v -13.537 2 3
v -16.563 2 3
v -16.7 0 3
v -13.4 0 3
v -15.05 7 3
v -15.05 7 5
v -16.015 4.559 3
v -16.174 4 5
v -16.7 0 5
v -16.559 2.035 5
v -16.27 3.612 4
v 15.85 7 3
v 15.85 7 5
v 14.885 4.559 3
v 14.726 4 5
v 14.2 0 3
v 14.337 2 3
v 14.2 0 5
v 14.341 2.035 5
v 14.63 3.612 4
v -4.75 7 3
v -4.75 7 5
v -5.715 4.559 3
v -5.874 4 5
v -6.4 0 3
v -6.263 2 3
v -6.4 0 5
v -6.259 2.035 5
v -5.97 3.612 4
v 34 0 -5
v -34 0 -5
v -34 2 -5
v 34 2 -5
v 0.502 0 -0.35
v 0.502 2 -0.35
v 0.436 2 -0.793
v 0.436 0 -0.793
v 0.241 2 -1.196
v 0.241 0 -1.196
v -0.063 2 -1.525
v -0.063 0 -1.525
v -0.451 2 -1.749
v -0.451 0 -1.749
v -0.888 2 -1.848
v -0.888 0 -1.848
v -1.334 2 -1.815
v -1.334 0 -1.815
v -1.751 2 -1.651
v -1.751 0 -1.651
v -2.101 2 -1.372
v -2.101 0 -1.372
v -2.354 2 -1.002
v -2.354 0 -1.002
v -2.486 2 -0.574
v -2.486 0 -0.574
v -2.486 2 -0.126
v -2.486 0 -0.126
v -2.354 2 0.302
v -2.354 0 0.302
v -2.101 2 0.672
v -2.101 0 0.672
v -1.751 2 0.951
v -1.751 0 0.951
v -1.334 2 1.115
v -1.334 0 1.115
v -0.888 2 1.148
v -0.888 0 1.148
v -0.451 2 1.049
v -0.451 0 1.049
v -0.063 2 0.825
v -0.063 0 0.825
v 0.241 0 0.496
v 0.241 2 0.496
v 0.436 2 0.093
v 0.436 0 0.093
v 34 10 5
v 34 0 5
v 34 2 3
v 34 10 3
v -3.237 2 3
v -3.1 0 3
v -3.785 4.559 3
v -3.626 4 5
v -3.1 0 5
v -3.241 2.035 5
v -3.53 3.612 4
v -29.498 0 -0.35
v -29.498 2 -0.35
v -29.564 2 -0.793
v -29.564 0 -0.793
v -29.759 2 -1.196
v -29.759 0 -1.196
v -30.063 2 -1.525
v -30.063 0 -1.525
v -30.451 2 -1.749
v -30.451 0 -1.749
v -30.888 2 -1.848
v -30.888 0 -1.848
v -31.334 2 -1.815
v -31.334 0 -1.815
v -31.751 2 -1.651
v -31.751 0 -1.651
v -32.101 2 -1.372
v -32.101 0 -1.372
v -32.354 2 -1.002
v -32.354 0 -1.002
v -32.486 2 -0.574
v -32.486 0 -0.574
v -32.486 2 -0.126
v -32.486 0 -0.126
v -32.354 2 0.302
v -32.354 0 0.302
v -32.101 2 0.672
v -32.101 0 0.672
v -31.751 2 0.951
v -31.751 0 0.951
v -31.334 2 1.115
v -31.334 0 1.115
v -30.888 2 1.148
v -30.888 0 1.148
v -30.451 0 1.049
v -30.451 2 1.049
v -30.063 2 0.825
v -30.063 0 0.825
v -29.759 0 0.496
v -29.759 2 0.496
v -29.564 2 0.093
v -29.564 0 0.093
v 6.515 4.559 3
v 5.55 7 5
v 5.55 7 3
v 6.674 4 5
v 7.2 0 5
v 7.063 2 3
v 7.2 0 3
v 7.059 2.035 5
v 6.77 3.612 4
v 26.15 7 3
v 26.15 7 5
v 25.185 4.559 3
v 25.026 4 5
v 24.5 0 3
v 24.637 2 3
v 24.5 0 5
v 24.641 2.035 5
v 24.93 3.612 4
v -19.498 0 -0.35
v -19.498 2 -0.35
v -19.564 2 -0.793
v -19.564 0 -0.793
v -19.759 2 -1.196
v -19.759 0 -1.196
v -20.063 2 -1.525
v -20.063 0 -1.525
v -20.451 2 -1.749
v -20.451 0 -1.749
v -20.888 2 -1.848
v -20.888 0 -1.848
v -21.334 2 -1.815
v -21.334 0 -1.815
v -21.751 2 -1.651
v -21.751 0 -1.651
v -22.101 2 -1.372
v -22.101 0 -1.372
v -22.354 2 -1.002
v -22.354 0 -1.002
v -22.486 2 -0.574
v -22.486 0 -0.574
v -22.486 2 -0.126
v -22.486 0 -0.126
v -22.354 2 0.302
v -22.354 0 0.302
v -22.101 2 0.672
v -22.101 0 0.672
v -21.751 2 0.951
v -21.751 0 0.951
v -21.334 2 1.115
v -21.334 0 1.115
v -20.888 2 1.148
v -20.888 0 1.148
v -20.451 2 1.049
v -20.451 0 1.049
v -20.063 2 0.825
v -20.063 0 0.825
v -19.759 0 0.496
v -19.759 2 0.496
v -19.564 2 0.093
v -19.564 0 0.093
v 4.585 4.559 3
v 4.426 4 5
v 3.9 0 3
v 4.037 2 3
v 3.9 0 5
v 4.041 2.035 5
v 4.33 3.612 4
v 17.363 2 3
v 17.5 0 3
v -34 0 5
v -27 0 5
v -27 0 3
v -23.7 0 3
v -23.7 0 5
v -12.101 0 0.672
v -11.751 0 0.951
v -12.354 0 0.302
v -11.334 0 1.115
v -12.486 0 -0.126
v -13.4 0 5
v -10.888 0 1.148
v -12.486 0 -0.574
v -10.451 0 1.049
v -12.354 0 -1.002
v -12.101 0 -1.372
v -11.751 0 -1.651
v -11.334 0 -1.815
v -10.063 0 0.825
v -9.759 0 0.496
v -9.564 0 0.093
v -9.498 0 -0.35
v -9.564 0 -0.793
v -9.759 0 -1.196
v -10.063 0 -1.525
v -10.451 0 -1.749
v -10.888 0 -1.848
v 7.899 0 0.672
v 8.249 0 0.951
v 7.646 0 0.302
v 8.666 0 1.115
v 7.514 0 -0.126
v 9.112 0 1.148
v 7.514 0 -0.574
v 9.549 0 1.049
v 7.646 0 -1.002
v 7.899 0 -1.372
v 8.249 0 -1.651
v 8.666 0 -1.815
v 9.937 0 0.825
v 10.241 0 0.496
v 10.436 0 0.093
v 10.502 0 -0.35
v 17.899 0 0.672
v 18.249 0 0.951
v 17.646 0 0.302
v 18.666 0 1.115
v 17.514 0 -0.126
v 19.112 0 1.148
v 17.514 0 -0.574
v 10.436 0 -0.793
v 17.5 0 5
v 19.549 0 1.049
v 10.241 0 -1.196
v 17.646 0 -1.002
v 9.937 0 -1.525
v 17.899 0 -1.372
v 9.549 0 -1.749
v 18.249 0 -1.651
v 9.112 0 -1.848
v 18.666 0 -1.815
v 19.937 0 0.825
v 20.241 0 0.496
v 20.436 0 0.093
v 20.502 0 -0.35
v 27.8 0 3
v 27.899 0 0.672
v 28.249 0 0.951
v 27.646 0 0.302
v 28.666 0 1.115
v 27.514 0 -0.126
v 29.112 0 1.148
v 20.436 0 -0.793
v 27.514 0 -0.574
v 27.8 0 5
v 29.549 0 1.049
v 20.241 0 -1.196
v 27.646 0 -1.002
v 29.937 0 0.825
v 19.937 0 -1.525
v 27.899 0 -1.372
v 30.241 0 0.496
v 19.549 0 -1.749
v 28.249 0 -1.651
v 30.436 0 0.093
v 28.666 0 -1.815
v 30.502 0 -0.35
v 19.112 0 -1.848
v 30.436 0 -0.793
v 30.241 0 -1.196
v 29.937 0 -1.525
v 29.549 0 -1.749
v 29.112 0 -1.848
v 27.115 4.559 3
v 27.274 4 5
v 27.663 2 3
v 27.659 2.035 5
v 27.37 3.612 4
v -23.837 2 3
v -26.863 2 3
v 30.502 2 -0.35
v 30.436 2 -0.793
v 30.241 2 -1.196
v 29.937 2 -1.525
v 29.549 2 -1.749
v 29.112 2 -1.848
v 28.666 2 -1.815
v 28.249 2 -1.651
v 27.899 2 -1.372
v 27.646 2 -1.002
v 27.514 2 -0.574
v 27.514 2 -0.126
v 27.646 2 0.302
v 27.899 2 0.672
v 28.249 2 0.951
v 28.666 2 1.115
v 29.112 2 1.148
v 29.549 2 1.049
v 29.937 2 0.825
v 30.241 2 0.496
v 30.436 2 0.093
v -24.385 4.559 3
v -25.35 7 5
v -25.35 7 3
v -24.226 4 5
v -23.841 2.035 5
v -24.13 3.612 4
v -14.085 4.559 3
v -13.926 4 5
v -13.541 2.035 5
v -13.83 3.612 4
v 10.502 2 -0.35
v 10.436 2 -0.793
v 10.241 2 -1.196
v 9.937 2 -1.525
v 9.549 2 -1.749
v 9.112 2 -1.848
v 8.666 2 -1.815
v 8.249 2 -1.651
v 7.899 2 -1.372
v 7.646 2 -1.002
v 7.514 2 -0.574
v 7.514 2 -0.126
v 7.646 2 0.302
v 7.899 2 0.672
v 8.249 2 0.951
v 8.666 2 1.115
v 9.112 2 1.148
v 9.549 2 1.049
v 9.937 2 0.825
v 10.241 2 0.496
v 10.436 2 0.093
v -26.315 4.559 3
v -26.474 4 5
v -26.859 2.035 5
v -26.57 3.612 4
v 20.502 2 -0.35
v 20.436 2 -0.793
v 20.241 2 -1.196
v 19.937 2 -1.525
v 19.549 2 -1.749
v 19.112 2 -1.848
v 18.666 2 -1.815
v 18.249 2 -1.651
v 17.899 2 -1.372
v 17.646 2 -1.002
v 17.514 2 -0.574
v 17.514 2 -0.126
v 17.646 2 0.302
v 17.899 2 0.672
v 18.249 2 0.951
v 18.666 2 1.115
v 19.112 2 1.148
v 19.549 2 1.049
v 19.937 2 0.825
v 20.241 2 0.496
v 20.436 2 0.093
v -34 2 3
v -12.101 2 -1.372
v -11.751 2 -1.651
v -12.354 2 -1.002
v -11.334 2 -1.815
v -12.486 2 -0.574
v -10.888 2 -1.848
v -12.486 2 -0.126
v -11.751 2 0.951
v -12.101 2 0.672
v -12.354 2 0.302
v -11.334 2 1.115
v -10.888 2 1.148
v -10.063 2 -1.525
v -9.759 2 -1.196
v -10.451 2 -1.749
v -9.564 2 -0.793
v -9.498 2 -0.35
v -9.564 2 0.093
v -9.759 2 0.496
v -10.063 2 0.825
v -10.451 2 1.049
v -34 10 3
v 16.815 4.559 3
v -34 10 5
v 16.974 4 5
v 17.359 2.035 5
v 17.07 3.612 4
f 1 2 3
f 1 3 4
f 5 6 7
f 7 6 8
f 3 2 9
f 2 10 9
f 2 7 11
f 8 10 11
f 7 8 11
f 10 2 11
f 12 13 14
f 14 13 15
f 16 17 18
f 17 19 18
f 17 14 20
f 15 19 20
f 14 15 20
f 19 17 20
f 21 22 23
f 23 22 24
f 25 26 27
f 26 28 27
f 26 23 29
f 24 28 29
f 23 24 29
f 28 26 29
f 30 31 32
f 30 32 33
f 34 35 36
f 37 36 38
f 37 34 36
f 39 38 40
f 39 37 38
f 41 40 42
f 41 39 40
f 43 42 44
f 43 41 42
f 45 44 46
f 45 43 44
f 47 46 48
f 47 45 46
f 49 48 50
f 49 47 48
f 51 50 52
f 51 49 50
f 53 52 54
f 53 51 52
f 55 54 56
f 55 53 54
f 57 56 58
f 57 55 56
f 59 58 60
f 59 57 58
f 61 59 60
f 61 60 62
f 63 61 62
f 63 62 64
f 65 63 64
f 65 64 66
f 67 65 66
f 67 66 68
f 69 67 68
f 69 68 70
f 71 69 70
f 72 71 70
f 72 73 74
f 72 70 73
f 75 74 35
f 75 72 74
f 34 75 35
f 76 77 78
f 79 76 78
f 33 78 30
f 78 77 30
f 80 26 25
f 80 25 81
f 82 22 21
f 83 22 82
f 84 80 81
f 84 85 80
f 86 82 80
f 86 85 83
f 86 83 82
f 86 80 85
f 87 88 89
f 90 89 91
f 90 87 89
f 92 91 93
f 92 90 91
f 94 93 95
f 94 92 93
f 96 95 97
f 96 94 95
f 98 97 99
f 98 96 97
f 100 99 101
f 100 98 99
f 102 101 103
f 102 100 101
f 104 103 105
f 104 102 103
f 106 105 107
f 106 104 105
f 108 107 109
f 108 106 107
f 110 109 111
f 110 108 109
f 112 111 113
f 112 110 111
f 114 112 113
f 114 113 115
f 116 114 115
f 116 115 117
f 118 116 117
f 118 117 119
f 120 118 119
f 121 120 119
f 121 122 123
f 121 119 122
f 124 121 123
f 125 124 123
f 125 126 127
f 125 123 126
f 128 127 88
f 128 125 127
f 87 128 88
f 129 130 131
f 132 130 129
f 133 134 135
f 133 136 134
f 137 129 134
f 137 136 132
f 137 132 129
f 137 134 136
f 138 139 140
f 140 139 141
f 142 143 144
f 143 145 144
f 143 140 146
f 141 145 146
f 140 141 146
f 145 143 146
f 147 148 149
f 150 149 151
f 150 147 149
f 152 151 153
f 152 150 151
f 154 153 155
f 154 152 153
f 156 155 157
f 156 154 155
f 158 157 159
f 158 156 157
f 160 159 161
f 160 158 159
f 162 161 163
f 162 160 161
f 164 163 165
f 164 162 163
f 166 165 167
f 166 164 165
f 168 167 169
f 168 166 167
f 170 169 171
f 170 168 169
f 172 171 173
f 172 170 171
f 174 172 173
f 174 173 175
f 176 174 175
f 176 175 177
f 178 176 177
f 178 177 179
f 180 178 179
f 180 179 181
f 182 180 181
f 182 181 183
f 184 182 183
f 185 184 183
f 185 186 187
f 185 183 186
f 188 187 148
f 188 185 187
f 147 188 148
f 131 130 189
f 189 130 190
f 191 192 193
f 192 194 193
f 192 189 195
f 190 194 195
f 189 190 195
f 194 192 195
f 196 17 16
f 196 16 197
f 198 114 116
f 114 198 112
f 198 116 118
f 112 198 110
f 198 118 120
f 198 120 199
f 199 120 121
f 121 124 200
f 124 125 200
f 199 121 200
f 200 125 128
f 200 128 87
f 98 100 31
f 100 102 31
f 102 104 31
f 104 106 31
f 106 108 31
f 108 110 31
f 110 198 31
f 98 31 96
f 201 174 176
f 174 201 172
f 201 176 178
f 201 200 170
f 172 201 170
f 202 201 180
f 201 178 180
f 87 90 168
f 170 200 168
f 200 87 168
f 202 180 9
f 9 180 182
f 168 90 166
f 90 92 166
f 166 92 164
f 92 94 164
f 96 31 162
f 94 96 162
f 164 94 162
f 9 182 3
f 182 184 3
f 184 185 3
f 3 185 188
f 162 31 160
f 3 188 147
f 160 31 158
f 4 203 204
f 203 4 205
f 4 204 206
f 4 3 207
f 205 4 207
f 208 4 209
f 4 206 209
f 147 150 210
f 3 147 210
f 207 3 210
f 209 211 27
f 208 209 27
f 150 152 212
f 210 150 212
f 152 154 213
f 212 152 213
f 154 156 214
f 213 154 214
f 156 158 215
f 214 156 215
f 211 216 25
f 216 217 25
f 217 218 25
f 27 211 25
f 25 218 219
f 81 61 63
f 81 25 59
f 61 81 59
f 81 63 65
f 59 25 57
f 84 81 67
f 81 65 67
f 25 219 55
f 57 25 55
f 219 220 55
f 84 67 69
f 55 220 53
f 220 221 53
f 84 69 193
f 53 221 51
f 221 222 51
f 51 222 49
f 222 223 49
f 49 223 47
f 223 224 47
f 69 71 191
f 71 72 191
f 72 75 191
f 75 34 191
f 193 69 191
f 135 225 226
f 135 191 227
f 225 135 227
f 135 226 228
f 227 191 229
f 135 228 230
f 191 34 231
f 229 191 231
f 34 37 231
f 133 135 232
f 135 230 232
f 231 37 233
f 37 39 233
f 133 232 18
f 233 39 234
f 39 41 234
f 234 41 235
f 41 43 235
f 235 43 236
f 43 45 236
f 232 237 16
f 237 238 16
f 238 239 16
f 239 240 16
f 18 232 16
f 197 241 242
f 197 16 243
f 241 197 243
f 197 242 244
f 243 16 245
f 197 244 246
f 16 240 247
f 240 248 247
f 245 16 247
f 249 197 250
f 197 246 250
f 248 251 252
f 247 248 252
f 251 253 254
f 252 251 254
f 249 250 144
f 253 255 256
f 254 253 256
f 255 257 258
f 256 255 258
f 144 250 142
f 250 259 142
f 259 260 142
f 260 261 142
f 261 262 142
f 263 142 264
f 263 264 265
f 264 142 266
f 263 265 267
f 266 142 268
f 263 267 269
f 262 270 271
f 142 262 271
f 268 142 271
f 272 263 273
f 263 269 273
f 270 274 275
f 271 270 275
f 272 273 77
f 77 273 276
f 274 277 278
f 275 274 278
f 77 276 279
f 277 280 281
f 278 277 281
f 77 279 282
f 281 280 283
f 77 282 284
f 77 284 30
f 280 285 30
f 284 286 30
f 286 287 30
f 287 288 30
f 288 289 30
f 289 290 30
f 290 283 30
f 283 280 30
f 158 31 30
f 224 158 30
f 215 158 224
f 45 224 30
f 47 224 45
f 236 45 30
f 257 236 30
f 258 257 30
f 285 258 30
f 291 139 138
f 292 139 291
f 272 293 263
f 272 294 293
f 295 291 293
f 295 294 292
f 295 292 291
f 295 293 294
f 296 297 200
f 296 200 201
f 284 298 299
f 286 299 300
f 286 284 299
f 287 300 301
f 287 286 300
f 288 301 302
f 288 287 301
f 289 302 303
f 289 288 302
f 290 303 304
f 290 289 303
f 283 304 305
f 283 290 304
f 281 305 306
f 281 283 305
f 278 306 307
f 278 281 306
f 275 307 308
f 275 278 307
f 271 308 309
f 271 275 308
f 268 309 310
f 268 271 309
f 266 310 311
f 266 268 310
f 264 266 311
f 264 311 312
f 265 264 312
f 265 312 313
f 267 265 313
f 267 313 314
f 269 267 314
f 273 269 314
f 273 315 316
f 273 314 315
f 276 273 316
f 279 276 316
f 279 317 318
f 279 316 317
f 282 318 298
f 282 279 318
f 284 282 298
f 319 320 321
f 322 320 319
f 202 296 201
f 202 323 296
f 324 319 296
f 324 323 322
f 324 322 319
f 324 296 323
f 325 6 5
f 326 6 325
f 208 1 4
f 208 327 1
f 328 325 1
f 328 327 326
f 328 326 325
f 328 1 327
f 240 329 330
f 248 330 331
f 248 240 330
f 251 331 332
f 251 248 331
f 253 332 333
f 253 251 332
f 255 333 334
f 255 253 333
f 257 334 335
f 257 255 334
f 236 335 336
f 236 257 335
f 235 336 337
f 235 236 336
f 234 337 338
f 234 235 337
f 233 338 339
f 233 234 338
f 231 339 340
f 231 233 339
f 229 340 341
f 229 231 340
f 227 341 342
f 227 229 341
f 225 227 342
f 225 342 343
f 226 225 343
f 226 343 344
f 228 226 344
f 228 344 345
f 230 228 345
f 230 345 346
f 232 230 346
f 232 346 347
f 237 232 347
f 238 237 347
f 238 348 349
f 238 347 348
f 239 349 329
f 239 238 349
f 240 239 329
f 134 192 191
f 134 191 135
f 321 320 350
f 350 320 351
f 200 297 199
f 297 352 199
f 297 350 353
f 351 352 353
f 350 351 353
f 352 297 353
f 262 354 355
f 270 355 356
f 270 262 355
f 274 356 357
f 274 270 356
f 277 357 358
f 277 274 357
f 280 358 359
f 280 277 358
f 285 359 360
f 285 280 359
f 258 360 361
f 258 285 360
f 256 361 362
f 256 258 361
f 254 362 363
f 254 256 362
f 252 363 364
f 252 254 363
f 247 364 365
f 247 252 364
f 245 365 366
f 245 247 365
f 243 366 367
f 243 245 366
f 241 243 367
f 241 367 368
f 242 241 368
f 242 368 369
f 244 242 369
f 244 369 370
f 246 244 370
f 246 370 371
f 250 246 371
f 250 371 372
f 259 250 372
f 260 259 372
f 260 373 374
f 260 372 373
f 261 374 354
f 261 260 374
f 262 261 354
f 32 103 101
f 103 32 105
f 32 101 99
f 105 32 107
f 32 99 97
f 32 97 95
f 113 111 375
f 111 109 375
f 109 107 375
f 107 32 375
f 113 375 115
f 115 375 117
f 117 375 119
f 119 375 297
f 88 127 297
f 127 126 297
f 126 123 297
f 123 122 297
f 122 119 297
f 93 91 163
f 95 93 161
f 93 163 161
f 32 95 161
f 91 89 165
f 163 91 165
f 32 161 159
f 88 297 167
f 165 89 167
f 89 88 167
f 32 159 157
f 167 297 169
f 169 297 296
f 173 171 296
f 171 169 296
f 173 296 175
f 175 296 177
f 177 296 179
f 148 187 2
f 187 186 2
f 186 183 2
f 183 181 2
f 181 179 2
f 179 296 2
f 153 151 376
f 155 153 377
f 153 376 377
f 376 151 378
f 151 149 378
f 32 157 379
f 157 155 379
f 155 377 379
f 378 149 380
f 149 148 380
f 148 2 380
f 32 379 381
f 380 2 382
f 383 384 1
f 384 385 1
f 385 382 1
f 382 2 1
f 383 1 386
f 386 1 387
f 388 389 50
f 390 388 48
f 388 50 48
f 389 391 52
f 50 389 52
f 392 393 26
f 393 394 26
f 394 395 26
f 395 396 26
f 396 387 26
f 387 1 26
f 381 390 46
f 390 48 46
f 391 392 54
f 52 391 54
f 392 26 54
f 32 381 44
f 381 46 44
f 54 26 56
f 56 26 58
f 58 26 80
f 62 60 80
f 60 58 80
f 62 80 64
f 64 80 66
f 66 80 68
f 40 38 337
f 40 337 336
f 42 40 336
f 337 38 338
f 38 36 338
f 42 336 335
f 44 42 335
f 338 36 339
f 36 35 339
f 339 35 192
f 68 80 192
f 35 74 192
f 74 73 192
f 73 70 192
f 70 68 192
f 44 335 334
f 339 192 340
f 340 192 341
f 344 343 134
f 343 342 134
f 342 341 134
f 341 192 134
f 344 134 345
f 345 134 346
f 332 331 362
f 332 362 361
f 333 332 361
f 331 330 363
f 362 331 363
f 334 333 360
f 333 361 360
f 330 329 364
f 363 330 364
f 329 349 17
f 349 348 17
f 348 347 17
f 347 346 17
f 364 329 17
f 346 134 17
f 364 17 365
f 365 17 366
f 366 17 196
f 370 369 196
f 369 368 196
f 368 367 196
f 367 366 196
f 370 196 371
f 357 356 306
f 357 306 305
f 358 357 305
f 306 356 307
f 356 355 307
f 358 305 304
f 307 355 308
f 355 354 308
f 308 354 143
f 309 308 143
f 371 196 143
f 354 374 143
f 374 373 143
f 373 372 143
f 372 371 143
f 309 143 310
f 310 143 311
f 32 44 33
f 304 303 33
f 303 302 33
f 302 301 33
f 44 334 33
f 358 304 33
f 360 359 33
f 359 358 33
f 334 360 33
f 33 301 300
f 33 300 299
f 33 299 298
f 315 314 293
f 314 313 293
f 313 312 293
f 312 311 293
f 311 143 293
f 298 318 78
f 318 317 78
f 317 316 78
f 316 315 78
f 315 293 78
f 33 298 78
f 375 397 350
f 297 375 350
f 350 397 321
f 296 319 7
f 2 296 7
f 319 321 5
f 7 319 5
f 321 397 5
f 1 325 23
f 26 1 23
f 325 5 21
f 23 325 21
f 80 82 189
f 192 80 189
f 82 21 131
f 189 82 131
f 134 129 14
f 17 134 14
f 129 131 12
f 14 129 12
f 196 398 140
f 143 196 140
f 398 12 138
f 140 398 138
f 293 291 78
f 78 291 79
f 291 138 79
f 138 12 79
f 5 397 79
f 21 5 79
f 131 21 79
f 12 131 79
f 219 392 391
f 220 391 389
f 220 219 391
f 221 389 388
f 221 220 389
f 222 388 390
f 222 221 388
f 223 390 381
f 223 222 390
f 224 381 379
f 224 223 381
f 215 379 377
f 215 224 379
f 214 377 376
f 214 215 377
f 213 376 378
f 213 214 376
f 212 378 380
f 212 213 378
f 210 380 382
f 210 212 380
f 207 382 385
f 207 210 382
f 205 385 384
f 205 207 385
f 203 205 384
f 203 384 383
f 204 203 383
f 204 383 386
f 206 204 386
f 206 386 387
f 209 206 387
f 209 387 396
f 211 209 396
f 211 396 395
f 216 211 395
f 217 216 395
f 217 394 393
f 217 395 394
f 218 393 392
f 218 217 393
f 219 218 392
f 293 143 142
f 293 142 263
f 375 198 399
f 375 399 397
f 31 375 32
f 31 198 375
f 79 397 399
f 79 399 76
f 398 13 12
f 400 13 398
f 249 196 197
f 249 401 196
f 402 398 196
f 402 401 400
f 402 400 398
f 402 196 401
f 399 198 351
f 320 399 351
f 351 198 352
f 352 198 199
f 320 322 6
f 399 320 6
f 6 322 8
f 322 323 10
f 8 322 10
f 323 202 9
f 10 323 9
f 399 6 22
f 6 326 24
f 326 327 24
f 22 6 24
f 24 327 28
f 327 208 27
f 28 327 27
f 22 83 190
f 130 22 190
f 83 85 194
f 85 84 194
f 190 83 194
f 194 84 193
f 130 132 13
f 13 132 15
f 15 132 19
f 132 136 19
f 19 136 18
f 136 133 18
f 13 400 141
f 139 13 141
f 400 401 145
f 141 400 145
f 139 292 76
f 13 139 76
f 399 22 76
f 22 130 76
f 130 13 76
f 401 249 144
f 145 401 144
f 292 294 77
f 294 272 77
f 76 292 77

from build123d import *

# Parameters (mm, degrees)
SKETCH1_W                      = 68
SKETCH1_H                      = 10
SKETCH1_R                      = 1.5025
BOSS_EXTRUDE1_DEPTH            = 10
CUT_EXTRUDE1_REACH             = 7
SKETCH2_W                      = 68
SKETCH2_H                      = 8
CUT_EXTRUDE1_DIRECTION_2_DEPTH = 3
CUT_EXTRUDE2_DEPTH             = 2


with BuildPart() as part:
    # Sketch1 → Boss-Extrude1 (new body)
    with BuildSketch(Plane(origin=(0, 0, 0), x_dir=(1, 0, 0), z_dir=(0, 1, 0))):
        Rectangle(SKETCH1_W, SKETCH1_H)
        with Locations((-31, 0.35)):
            Circle(SKETCH1_R, mode=Mode.SUBTRACT)
        with Locations((-21, 0.35)):
            Circle(SKETCH1_R, mode=Mode.SUBTRACT)
        with Locations((-11, 0.35)):
            Circle(SKETCH1_R, mode=Mode.SUBTRACT)
        with Locations((-1, 0.35)):
            Circle(SKETCH1_R, mode=Mode.SUBTRACT)
        with Locations((9, 0.35)):
            Circle(SKETCH1_R, mode=Mode.SUBTRACT)
        with Locations((19, 0.35)):
            Circle(SKETCH1_R, mode=Mode.SUBTRACT)
        with Locations((29, 0.35)):
            Circle(SKETCH1_R, mode=Mode.SUBTRACT)
    extrude(amount=BOSS_EXTRUDE1_DEPTH)

    # Sketch2 → Cut-Extrude1 (cut, up to next)
    with BuildSketch(Plane.XY, mode=Mode.PRIVATE) as cut_extrude1_sk1:
        with Locations((0, 6)):
            Rectangle(SKETCH2_W, SKETCH2_H)
    cut_extrude1_tool1 = extrude(cut_extrude1_sk1.sketch, amount=-CUT_EXTRUDE1_REACH, mode=Mode.PRIVATE) & part.part
    add(cut_extrude1_tool1.solids().sort_by_distance((0, 6, 0))[0], mode=Mode.SUBTRACT)

    # Sketch2 → Cut-Extrude1 direction 2 (cut)
    with BuildSketch(Plane.XY):
        with Locations((0, 6)):
            Rectangle(SKETCH2_W, SKETCH2_H)
    extrude(amount=CUT_EXTRUDE1_DIRECTION_2_DEPTH, mode=Mode.SUBTRACT)

    # Sketch3 → Cut-Extrude2 (cut)
    with BuildSketch(Plane.XY.offset(5)):
        with BuildLine():
            Line((-27, 0), (-23.7, 0))
            add(Edge.make_bspline(
                [(-25.35, 7), (-23.734888234, 3.724961413), (-23.7, 0)],
                knots=[0, 0, 0, 1, 1, 1], degree=2))
            add(Edge.make_bspline(
                [(-25.35, 7), (-26.965111766, 3.724961413), (-27, 0)],
                knots=[0, 0, 0, 1, 1, 1], degree=2))
        make_face()
        with BuildLine():
            Line((-16.7, 0), (-13.4, 0))
            add(Edge.make_bspline(
                [(-15.05, 7), (-13.434888234, 3.724961413), (-13.4, 0)],
                knots=[0, 0, 0, 1, 1, 1], degree=2))
            add(Edge.make_bspline(
                [(-15.05, 7), (-16.665111766, 3.724961413), (-16.7, 0)],
                knots=[0, 0, 0, 1, 1, 1], degree=2))
        make_face()
        with BuildLine():
            Line((-6.4, 0), (-3.1, 0))
            add(Edge.make_bspline(
                [(-4.75, 7), (-3.134888234, 3.724961413), (-3.1, 0)],
                knots=[0, 0, 0, 1, 1, 1], degree=2))
            add(Edge.make_bspline(
                [(-4.75, 7), (-6.365111766, 3.724961413), (-6.4, 0)],
                knots=[0, 0, 0, 1, 1, 1], degree=2))
        make_face()
        with BuildLine():
            Line((3.9, 0), (7.2, 0))
            add(Edge.make_bspline(
                [(5.55, 7), (7.165111766, 3.724961413), (7.2, 0)],
                knots=[0, 0, 0, 1, 1, 1], degree=2))
            add(Edge.make_bspline(
                [(5.55, 7), (3.934888234, 3.724961413), (3.9, 0)],
                knots=[0, 0, 0, 1, 1, 1], degree=2))
        make_face()
        with BuildLine():
            Line((14.2, 0), (17.5, 0))
            add(Edge.make_bspline(
                [(15.85, 7), (17.465111766, 3.724961413), (17.5, 0)],
                knots=[0, 0, 0, 1, 1, 1], degree=2))
            add(Edge.make_bspline(
                [(15.85, 7), (14.234888234, 3.724961413), (14.2, 0)],
                knots=[0, 0, 0, 1, 1, 1], degree=2))
        make_face()
        with BuildLine():
            Line((24.5, 0), (27.8, 0))
            add(Edge.make_bspline(
                [(26.15, 7), (27.765111766, 3.724961413), (27.8, 0)],
                knots=[0, 0, 0, 1, 1, 1], degree=2))
            add(Edge.make_bspline(
                [(26.15, 7), (24.534888234, 3.724961413), (24.5, 0)],
                knots=[0, 0, 0, 1, 1, 1], degree=2))
        make_face()
    extrude(amount=-CUT_EXTRUDE2_DEPTH, mode=Mode.SUBTRACT)


solid = part.part
